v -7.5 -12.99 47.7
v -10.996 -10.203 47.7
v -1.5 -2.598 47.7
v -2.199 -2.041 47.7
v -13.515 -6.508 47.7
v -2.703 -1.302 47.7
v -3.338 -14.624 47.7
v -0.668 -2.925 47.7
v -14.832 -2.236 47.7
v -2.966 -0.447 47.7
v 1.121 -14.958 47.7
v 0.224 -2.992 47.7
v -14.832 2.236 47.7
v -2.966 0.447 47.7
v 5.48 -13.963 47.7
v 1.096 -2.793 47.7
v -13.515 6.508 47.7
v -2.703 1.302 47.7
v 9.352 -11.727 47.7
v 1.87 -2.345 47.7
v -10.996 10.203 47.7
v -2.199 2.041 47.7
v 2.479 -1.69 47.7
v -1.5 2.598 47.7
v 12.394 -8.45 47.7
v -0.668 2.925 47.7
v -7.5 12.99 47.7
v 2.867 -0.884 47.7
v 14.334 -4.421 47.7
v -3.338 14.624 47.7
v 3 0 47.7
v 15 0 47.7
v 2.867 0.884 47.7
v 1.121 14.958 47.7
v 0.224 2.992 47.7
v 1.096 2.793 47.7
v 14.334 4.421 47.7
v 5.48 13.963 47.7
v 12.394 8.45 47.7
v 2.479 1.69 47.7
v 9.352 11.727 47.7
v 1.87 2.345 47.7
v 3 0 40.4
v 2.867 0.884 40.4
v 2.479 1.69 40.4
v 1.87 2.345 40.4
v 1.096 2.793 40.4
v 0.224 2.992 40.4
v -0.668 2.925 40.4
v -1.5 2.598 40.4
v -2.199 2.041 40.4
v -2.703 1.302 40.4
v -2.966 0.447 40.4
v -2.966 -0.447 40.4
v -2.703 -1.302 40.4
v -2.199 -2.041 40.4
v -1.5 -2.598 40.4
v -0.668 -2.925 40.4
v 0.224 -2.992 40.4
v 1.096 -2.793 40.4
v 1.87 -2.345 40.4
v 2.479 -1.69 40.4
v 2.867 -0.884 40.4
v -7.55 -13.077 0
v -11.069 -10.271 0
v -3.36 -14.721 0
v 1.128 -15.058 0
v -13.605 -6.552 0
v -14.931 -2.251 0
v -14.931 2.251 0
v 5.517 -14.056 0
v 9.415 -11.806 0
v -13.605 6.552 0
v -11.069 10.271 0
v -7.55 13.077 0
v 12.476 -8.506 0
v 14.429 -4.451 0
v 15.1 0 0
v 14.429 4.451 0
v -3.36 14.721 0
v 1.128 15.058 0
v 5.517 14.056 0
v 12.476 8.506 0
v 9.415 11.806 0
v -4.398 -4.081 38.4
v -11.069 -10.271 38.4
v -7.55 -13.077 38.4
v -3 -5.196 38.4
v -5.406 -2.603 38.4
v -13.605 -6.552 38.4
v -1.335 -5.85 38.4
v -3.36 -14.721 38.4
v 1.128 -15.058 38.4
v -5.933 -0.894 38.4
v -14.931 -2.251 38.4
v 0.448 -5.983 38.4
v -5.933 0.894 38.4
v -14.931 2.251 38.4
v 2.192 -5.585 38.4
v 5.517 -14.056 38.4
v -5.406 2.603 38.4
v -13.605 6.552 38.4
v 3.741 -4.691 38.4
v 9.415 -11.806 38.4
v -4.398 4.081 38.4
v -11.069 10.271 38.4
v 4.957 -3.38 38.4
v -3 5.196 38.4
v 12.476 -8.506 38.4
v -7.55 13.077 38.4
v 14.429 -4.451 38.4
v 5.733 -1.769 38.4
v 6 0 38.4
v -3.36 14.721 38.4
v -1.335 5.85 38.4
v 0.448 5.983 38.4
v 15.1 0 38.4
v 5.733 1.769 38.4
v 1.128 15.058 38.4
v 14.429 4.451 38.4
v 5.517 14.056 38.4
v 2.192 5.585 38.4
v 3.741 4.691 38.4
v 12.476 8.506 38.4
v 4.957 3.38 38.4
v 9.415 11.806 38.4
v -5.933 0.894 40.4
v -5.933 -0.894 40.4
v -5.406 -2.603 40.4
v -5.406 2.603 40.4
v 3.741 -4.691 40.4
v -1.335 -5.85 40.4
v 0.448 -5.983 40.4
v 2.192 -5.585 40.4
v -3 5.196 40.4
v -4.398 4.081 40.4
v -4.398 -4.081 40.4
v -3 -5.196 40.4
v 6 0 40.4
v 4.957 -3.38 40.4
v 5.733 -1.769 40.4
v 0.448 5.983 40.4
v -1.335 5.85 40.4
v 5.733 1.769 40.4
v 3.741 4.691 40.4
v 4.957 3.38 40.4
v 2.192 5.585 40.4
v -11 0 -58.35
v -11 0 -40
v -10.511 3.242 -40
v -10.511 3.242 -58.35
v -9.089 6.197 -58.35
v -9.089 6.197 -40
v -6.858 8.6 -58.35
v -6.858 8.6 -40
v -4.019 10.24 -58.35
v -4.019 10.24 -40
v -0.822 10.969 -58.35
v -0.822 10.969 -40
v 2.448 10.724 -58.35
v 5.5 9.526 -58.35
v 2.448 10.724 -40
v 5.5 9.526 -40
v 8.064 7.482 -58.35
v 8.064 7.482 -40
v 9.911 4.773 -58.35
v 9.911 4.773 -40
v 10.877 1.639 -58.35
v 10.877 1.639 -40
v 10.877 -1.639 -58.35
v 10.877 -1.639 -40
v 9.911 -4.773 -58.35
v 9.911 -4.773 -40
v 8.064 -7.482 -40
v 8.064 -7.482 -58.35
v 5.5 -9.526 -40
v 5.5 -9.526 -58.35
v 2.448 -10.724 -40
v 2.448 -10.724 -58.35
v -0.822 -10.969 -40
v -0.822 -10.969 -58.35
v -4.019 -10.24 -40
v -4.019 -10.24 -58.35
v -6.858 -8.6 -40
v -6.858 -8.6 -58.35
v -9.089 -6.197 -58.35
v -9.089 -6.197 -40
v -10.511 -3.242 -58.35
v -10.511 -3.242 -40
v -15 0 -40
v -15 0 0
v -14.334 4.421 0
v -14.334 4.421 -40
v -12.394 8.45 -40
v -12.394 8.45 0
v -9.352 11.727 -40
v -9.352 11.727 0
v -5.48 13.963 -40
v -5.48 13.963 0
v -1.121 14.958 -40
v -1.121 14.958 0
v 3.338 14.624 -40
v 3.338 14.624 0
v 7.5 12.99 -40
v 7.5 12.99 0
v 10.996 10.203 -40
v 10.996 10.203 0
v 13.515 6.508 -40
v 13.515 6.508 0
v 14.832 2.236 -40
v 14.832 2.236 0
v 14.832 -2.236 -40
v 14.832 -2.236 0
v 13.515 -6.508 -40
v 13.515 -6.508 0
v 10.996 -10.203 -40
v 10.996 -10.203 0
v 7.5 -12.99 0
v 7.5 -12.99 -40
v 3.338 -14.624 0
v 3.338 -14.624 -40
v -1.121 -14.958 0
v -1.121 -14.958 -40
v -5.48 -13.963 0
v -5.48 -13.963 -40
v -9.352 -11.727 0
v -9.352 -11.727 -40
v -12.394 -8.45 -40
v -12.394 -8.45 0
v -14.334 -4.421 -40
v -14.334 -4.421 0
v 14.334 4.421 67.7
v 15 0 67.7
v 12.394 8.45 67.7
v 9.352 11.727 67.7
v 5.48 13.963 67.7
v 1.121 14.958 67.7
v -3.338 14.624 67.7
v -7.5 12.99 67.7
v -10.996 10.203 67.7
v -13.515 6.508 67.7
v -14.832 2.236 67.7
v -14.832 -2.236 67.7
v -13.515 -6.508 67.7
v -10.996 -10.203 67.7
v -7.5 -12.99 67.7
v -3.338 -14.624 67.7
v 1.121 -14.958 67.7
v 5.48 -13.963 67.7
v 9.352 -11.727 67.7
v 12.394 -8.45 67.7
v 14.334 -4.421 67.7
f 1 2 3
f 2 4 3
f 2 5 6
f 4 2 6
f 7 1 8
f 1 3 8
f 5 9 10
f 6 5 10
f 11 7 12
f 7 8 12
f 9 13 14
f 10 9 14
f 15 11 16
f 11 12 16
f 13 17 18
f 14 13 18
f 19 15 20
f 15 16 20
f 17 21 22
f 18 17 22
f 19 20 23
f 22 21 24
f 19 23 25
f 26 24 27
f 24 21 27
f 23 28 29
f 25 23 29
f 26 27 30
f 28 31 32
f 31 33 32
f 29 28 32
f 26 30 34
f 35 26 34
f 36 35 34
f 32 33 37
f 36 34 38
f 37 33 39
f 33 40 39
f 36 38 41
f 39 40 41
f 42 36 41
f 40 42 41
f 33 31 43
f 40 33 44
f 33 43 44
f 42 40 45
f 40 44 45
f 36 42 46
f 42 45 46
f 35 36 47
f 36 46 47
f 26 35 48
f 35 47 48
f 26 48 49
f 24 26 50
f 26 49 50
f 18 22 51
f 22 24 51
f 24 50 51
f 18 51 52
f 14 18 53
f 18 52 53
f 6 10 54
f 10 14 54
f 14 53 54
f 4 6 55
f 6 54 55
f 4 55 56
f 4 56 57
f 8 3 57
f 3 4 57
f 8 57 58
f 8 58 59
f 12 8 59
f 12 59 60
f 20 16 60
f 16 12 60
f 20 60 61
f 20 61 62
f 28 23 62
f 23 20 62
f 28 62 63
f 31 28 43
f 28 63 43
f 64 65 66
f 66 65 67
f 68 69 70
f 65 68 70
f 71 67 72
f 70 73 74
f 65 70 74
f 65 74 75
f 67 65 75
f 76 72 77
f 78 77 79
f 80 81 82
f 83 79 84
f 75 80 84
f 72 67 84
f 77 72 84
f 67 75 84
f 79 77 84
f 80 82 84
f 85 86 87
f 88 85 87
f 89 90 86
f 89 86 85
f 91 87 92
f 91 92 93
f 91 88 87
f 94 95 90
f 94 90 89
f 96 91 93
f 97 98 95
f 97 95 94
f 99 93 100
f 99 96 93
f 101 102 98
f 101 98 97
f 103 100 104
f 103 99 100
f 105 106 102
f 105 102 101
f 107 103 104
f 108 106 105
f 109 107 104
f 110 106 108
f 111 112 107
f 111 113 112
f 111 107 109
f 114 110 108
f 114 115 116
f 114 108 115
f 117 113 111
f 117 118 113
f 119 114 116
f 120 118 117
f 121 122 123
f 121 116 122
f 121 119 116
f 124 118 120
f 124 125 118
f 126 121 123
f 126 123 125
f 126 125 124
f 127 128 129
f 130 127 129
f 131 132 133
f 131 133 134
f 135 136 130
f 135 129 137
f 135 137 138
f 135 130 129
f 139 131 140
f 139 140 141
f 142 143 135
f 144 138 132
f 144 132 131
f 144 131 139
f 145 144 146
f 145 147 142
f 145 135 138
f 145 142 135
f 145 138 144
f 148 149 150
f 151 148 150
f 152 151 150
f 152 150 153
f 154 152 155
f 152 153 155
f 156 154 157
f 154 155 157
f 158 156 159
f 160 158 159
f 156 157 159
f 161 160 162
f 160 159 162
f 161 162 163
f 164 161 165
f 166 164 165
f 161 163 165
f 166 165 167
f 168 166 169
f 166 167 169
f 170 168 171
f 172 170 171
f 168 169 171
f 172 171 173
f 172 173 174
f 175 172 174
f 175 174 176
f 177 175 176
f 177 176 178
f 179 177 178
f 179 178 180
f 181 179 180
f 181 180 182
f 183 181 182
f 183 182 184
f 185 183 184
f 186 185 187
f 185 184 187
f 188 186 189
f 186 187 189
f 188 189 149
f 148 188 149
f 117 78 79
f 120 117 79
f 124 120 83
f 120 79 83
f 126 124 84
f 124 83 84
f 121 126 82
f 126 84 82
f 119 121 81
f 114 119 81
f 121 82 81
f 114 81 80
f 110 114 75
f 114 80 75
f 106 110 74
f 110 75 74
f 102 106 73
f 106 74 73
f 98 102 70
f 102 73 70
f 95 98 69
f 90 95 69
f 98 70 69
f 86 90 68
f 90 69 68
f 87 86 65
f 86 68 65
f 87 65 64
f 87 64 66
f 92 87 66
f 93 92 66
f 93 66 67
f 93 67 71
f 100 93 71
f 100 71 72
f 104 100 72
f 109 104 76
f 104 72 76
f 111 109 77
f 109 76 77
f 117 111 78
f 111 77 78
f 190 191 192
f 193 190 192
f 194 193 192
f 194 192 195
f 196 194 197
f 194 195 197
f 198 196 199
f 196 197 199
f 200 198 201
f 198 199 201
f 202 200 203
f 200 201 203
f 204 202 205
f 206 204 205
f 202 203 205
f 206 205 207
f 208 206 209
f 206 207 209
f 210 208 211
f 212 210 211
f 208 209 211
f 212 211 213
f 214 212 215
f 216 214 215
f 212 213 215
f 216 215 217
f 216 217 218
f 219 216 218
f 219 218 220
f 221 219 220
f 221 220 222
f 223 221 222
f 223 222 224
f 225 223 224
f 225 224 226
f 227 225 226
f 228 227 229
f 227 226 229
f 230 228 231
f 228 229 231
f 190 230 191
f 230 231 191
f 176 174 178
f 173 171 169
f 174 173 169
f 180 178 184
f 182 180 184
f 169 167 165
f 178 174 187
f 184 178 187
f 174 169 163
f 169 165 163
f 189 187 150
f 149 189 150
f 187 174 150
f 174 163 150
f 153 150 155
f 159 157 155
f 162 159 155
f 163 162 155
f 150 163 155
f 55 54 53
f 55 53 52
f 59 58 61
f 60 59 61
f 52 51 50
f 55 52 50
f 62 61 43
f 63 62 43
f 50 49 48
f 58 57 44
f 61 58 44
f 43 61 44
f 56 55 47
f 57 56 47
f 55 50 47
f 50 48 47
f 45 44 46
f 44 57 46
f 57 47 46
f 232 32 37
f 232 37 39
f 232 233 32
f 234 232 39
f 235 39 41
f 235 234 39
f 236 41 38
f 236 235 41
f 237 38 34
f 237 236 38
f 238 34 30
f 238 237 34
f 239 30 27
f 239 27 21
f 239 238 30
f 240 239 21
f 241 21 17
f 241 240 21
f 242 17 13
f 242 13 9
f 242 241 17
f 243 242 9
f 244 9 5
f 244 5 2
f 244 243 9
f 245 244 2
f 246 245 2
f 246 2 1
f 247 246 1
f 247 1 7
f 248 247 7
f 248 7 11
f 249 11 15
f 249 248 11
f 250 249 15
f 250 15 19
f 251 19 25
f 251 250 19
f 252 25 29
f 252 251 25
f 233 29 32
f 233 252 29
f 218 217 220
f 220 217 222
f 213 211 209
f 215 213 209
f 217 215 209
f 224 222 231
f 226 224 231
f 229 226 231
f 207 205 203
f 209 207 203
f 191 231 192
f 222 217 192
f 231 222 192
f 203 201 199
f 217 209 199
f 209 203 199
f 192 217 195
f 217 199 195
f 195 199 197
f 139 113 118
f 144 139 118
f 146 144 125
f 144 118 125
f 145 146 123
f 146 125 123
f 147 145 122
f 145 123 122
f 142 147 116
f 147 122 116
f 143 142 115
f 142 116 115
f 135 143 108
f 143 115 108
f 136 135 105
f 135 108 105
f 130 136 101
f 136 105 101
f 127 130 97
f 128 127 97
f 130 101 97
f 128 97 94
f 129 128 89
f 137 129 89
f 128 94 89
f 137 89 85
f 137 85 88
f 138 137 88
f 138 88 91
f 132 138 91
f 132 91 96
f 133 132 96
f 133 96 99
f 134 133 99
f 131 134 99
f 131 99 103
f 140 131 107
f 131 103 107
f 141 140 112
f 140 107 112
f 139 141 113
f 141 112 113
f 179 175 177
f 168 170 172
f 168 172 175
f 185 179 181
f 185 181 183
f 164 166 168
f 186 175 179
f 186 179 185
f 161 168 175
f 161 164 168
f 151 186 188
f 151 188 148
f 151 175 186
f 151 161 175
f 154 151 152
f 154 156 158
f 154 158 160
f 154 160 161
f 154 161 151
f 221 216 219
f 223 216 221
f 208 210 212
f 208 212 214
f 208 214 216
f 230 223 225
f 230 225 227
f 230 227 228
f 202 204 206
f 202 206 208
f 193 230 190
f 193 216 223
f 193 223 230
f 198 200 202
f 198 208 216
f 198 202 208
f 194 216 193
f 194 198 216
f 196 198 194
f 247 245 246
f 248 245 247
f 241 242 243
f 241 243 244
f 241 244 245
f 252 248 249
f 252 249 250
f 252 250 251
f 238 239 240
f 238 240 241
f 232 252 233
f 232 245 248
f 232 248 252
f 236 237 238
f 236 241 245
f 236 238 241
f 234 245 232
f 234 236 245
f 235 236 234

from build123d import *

# Parameters (mm, degrees)
SKETCH1_R                = 15.1
BOSS_EXTRUDE1_DEPTH      = 38.4
SKETCH2_R                = 15
BOSS_EXTRUDE2_DEPTH      = 40
SKETCH3_R                = 6
BOSS_EXTRUDE3_DEPTH      = 2
SKETCH4_R                = 11
BOSS_EXTRUDE4_DEPTH      = 18.35
SKETCH5_R                = 3
BOSS_EXTRUDE5_DEPTH      = 17.3
BOSS_EXTRUDE6_DEPTH      = 10
BOSS_EXTRUDE6_DEPTH_BACK = 10
SKETCH6_R                = 15


with BuildPart() as part:
    # Sketch1 → Boss-Extrude1 (new body)
    with BuildSketch(Plane.XY):
        Circle(SKETCH1_R)
    extrude(amount=BOSS_EXTRUDE1_DEPTH)

    # Sketch3 → Boss-Extrude3 (add)
    with BuildSketch(Plane.XY.offset(38.4)):
        Circle(SKETCH3_R)
    extrude(amount=BOSS_EXTRUDE3_DEPTH)


with BuildPart() as body_2:
    # Sketch2 → Boss-Extrude2 (new body)
    with BuildSketch(Plane(origin=(0, 0, 0), x_dir=(-1, 0, 0), z_dir=(0, 0, -1))):
        Circle(SKETCH2_R)
    extrude(amount=BOSS_EXTRUDE2_DEPTH)


with BuildPart() as body_3:
    # Sketch4 → Boss-Extrude4 (new body)
    with BuildSketch(Plane(origin=(0, 0, -40), x_dir=(-1, 0, 0), z_dir=(0, 0, -1))):
        Circle(SKETCH4_R)
    extrude(amount=BOSS_EXTRUDE4_DEPTH)


with BuildPart() as body_4:
    # Sketch5 → Boss-Extrude5 (new body)
    with BuildSketch(Plane.XY.offset(40.4)):
        Circle(SKETCH5_R)
    extrude(amount=BOSS_EXTRUDE5_DEPTH)

    # Sketch6 → Boss-Extrude6 (add, two sides: drawn at the far end of the back side and taken through both)
    with BuildSketch(Plane.XY.offset(57.7).offset(-BOSS_EXTRUDE6_DEPTH_BACK)):
        Circle(SKETCH6_R)
    extrude(amount=BOSS_EXTRUDE6_DEPTH + BOSS_EXTRUDE6_DEPTH_BACK)


solid = Compound([part.part, body_2.part, body_3.part, body_4.part])
